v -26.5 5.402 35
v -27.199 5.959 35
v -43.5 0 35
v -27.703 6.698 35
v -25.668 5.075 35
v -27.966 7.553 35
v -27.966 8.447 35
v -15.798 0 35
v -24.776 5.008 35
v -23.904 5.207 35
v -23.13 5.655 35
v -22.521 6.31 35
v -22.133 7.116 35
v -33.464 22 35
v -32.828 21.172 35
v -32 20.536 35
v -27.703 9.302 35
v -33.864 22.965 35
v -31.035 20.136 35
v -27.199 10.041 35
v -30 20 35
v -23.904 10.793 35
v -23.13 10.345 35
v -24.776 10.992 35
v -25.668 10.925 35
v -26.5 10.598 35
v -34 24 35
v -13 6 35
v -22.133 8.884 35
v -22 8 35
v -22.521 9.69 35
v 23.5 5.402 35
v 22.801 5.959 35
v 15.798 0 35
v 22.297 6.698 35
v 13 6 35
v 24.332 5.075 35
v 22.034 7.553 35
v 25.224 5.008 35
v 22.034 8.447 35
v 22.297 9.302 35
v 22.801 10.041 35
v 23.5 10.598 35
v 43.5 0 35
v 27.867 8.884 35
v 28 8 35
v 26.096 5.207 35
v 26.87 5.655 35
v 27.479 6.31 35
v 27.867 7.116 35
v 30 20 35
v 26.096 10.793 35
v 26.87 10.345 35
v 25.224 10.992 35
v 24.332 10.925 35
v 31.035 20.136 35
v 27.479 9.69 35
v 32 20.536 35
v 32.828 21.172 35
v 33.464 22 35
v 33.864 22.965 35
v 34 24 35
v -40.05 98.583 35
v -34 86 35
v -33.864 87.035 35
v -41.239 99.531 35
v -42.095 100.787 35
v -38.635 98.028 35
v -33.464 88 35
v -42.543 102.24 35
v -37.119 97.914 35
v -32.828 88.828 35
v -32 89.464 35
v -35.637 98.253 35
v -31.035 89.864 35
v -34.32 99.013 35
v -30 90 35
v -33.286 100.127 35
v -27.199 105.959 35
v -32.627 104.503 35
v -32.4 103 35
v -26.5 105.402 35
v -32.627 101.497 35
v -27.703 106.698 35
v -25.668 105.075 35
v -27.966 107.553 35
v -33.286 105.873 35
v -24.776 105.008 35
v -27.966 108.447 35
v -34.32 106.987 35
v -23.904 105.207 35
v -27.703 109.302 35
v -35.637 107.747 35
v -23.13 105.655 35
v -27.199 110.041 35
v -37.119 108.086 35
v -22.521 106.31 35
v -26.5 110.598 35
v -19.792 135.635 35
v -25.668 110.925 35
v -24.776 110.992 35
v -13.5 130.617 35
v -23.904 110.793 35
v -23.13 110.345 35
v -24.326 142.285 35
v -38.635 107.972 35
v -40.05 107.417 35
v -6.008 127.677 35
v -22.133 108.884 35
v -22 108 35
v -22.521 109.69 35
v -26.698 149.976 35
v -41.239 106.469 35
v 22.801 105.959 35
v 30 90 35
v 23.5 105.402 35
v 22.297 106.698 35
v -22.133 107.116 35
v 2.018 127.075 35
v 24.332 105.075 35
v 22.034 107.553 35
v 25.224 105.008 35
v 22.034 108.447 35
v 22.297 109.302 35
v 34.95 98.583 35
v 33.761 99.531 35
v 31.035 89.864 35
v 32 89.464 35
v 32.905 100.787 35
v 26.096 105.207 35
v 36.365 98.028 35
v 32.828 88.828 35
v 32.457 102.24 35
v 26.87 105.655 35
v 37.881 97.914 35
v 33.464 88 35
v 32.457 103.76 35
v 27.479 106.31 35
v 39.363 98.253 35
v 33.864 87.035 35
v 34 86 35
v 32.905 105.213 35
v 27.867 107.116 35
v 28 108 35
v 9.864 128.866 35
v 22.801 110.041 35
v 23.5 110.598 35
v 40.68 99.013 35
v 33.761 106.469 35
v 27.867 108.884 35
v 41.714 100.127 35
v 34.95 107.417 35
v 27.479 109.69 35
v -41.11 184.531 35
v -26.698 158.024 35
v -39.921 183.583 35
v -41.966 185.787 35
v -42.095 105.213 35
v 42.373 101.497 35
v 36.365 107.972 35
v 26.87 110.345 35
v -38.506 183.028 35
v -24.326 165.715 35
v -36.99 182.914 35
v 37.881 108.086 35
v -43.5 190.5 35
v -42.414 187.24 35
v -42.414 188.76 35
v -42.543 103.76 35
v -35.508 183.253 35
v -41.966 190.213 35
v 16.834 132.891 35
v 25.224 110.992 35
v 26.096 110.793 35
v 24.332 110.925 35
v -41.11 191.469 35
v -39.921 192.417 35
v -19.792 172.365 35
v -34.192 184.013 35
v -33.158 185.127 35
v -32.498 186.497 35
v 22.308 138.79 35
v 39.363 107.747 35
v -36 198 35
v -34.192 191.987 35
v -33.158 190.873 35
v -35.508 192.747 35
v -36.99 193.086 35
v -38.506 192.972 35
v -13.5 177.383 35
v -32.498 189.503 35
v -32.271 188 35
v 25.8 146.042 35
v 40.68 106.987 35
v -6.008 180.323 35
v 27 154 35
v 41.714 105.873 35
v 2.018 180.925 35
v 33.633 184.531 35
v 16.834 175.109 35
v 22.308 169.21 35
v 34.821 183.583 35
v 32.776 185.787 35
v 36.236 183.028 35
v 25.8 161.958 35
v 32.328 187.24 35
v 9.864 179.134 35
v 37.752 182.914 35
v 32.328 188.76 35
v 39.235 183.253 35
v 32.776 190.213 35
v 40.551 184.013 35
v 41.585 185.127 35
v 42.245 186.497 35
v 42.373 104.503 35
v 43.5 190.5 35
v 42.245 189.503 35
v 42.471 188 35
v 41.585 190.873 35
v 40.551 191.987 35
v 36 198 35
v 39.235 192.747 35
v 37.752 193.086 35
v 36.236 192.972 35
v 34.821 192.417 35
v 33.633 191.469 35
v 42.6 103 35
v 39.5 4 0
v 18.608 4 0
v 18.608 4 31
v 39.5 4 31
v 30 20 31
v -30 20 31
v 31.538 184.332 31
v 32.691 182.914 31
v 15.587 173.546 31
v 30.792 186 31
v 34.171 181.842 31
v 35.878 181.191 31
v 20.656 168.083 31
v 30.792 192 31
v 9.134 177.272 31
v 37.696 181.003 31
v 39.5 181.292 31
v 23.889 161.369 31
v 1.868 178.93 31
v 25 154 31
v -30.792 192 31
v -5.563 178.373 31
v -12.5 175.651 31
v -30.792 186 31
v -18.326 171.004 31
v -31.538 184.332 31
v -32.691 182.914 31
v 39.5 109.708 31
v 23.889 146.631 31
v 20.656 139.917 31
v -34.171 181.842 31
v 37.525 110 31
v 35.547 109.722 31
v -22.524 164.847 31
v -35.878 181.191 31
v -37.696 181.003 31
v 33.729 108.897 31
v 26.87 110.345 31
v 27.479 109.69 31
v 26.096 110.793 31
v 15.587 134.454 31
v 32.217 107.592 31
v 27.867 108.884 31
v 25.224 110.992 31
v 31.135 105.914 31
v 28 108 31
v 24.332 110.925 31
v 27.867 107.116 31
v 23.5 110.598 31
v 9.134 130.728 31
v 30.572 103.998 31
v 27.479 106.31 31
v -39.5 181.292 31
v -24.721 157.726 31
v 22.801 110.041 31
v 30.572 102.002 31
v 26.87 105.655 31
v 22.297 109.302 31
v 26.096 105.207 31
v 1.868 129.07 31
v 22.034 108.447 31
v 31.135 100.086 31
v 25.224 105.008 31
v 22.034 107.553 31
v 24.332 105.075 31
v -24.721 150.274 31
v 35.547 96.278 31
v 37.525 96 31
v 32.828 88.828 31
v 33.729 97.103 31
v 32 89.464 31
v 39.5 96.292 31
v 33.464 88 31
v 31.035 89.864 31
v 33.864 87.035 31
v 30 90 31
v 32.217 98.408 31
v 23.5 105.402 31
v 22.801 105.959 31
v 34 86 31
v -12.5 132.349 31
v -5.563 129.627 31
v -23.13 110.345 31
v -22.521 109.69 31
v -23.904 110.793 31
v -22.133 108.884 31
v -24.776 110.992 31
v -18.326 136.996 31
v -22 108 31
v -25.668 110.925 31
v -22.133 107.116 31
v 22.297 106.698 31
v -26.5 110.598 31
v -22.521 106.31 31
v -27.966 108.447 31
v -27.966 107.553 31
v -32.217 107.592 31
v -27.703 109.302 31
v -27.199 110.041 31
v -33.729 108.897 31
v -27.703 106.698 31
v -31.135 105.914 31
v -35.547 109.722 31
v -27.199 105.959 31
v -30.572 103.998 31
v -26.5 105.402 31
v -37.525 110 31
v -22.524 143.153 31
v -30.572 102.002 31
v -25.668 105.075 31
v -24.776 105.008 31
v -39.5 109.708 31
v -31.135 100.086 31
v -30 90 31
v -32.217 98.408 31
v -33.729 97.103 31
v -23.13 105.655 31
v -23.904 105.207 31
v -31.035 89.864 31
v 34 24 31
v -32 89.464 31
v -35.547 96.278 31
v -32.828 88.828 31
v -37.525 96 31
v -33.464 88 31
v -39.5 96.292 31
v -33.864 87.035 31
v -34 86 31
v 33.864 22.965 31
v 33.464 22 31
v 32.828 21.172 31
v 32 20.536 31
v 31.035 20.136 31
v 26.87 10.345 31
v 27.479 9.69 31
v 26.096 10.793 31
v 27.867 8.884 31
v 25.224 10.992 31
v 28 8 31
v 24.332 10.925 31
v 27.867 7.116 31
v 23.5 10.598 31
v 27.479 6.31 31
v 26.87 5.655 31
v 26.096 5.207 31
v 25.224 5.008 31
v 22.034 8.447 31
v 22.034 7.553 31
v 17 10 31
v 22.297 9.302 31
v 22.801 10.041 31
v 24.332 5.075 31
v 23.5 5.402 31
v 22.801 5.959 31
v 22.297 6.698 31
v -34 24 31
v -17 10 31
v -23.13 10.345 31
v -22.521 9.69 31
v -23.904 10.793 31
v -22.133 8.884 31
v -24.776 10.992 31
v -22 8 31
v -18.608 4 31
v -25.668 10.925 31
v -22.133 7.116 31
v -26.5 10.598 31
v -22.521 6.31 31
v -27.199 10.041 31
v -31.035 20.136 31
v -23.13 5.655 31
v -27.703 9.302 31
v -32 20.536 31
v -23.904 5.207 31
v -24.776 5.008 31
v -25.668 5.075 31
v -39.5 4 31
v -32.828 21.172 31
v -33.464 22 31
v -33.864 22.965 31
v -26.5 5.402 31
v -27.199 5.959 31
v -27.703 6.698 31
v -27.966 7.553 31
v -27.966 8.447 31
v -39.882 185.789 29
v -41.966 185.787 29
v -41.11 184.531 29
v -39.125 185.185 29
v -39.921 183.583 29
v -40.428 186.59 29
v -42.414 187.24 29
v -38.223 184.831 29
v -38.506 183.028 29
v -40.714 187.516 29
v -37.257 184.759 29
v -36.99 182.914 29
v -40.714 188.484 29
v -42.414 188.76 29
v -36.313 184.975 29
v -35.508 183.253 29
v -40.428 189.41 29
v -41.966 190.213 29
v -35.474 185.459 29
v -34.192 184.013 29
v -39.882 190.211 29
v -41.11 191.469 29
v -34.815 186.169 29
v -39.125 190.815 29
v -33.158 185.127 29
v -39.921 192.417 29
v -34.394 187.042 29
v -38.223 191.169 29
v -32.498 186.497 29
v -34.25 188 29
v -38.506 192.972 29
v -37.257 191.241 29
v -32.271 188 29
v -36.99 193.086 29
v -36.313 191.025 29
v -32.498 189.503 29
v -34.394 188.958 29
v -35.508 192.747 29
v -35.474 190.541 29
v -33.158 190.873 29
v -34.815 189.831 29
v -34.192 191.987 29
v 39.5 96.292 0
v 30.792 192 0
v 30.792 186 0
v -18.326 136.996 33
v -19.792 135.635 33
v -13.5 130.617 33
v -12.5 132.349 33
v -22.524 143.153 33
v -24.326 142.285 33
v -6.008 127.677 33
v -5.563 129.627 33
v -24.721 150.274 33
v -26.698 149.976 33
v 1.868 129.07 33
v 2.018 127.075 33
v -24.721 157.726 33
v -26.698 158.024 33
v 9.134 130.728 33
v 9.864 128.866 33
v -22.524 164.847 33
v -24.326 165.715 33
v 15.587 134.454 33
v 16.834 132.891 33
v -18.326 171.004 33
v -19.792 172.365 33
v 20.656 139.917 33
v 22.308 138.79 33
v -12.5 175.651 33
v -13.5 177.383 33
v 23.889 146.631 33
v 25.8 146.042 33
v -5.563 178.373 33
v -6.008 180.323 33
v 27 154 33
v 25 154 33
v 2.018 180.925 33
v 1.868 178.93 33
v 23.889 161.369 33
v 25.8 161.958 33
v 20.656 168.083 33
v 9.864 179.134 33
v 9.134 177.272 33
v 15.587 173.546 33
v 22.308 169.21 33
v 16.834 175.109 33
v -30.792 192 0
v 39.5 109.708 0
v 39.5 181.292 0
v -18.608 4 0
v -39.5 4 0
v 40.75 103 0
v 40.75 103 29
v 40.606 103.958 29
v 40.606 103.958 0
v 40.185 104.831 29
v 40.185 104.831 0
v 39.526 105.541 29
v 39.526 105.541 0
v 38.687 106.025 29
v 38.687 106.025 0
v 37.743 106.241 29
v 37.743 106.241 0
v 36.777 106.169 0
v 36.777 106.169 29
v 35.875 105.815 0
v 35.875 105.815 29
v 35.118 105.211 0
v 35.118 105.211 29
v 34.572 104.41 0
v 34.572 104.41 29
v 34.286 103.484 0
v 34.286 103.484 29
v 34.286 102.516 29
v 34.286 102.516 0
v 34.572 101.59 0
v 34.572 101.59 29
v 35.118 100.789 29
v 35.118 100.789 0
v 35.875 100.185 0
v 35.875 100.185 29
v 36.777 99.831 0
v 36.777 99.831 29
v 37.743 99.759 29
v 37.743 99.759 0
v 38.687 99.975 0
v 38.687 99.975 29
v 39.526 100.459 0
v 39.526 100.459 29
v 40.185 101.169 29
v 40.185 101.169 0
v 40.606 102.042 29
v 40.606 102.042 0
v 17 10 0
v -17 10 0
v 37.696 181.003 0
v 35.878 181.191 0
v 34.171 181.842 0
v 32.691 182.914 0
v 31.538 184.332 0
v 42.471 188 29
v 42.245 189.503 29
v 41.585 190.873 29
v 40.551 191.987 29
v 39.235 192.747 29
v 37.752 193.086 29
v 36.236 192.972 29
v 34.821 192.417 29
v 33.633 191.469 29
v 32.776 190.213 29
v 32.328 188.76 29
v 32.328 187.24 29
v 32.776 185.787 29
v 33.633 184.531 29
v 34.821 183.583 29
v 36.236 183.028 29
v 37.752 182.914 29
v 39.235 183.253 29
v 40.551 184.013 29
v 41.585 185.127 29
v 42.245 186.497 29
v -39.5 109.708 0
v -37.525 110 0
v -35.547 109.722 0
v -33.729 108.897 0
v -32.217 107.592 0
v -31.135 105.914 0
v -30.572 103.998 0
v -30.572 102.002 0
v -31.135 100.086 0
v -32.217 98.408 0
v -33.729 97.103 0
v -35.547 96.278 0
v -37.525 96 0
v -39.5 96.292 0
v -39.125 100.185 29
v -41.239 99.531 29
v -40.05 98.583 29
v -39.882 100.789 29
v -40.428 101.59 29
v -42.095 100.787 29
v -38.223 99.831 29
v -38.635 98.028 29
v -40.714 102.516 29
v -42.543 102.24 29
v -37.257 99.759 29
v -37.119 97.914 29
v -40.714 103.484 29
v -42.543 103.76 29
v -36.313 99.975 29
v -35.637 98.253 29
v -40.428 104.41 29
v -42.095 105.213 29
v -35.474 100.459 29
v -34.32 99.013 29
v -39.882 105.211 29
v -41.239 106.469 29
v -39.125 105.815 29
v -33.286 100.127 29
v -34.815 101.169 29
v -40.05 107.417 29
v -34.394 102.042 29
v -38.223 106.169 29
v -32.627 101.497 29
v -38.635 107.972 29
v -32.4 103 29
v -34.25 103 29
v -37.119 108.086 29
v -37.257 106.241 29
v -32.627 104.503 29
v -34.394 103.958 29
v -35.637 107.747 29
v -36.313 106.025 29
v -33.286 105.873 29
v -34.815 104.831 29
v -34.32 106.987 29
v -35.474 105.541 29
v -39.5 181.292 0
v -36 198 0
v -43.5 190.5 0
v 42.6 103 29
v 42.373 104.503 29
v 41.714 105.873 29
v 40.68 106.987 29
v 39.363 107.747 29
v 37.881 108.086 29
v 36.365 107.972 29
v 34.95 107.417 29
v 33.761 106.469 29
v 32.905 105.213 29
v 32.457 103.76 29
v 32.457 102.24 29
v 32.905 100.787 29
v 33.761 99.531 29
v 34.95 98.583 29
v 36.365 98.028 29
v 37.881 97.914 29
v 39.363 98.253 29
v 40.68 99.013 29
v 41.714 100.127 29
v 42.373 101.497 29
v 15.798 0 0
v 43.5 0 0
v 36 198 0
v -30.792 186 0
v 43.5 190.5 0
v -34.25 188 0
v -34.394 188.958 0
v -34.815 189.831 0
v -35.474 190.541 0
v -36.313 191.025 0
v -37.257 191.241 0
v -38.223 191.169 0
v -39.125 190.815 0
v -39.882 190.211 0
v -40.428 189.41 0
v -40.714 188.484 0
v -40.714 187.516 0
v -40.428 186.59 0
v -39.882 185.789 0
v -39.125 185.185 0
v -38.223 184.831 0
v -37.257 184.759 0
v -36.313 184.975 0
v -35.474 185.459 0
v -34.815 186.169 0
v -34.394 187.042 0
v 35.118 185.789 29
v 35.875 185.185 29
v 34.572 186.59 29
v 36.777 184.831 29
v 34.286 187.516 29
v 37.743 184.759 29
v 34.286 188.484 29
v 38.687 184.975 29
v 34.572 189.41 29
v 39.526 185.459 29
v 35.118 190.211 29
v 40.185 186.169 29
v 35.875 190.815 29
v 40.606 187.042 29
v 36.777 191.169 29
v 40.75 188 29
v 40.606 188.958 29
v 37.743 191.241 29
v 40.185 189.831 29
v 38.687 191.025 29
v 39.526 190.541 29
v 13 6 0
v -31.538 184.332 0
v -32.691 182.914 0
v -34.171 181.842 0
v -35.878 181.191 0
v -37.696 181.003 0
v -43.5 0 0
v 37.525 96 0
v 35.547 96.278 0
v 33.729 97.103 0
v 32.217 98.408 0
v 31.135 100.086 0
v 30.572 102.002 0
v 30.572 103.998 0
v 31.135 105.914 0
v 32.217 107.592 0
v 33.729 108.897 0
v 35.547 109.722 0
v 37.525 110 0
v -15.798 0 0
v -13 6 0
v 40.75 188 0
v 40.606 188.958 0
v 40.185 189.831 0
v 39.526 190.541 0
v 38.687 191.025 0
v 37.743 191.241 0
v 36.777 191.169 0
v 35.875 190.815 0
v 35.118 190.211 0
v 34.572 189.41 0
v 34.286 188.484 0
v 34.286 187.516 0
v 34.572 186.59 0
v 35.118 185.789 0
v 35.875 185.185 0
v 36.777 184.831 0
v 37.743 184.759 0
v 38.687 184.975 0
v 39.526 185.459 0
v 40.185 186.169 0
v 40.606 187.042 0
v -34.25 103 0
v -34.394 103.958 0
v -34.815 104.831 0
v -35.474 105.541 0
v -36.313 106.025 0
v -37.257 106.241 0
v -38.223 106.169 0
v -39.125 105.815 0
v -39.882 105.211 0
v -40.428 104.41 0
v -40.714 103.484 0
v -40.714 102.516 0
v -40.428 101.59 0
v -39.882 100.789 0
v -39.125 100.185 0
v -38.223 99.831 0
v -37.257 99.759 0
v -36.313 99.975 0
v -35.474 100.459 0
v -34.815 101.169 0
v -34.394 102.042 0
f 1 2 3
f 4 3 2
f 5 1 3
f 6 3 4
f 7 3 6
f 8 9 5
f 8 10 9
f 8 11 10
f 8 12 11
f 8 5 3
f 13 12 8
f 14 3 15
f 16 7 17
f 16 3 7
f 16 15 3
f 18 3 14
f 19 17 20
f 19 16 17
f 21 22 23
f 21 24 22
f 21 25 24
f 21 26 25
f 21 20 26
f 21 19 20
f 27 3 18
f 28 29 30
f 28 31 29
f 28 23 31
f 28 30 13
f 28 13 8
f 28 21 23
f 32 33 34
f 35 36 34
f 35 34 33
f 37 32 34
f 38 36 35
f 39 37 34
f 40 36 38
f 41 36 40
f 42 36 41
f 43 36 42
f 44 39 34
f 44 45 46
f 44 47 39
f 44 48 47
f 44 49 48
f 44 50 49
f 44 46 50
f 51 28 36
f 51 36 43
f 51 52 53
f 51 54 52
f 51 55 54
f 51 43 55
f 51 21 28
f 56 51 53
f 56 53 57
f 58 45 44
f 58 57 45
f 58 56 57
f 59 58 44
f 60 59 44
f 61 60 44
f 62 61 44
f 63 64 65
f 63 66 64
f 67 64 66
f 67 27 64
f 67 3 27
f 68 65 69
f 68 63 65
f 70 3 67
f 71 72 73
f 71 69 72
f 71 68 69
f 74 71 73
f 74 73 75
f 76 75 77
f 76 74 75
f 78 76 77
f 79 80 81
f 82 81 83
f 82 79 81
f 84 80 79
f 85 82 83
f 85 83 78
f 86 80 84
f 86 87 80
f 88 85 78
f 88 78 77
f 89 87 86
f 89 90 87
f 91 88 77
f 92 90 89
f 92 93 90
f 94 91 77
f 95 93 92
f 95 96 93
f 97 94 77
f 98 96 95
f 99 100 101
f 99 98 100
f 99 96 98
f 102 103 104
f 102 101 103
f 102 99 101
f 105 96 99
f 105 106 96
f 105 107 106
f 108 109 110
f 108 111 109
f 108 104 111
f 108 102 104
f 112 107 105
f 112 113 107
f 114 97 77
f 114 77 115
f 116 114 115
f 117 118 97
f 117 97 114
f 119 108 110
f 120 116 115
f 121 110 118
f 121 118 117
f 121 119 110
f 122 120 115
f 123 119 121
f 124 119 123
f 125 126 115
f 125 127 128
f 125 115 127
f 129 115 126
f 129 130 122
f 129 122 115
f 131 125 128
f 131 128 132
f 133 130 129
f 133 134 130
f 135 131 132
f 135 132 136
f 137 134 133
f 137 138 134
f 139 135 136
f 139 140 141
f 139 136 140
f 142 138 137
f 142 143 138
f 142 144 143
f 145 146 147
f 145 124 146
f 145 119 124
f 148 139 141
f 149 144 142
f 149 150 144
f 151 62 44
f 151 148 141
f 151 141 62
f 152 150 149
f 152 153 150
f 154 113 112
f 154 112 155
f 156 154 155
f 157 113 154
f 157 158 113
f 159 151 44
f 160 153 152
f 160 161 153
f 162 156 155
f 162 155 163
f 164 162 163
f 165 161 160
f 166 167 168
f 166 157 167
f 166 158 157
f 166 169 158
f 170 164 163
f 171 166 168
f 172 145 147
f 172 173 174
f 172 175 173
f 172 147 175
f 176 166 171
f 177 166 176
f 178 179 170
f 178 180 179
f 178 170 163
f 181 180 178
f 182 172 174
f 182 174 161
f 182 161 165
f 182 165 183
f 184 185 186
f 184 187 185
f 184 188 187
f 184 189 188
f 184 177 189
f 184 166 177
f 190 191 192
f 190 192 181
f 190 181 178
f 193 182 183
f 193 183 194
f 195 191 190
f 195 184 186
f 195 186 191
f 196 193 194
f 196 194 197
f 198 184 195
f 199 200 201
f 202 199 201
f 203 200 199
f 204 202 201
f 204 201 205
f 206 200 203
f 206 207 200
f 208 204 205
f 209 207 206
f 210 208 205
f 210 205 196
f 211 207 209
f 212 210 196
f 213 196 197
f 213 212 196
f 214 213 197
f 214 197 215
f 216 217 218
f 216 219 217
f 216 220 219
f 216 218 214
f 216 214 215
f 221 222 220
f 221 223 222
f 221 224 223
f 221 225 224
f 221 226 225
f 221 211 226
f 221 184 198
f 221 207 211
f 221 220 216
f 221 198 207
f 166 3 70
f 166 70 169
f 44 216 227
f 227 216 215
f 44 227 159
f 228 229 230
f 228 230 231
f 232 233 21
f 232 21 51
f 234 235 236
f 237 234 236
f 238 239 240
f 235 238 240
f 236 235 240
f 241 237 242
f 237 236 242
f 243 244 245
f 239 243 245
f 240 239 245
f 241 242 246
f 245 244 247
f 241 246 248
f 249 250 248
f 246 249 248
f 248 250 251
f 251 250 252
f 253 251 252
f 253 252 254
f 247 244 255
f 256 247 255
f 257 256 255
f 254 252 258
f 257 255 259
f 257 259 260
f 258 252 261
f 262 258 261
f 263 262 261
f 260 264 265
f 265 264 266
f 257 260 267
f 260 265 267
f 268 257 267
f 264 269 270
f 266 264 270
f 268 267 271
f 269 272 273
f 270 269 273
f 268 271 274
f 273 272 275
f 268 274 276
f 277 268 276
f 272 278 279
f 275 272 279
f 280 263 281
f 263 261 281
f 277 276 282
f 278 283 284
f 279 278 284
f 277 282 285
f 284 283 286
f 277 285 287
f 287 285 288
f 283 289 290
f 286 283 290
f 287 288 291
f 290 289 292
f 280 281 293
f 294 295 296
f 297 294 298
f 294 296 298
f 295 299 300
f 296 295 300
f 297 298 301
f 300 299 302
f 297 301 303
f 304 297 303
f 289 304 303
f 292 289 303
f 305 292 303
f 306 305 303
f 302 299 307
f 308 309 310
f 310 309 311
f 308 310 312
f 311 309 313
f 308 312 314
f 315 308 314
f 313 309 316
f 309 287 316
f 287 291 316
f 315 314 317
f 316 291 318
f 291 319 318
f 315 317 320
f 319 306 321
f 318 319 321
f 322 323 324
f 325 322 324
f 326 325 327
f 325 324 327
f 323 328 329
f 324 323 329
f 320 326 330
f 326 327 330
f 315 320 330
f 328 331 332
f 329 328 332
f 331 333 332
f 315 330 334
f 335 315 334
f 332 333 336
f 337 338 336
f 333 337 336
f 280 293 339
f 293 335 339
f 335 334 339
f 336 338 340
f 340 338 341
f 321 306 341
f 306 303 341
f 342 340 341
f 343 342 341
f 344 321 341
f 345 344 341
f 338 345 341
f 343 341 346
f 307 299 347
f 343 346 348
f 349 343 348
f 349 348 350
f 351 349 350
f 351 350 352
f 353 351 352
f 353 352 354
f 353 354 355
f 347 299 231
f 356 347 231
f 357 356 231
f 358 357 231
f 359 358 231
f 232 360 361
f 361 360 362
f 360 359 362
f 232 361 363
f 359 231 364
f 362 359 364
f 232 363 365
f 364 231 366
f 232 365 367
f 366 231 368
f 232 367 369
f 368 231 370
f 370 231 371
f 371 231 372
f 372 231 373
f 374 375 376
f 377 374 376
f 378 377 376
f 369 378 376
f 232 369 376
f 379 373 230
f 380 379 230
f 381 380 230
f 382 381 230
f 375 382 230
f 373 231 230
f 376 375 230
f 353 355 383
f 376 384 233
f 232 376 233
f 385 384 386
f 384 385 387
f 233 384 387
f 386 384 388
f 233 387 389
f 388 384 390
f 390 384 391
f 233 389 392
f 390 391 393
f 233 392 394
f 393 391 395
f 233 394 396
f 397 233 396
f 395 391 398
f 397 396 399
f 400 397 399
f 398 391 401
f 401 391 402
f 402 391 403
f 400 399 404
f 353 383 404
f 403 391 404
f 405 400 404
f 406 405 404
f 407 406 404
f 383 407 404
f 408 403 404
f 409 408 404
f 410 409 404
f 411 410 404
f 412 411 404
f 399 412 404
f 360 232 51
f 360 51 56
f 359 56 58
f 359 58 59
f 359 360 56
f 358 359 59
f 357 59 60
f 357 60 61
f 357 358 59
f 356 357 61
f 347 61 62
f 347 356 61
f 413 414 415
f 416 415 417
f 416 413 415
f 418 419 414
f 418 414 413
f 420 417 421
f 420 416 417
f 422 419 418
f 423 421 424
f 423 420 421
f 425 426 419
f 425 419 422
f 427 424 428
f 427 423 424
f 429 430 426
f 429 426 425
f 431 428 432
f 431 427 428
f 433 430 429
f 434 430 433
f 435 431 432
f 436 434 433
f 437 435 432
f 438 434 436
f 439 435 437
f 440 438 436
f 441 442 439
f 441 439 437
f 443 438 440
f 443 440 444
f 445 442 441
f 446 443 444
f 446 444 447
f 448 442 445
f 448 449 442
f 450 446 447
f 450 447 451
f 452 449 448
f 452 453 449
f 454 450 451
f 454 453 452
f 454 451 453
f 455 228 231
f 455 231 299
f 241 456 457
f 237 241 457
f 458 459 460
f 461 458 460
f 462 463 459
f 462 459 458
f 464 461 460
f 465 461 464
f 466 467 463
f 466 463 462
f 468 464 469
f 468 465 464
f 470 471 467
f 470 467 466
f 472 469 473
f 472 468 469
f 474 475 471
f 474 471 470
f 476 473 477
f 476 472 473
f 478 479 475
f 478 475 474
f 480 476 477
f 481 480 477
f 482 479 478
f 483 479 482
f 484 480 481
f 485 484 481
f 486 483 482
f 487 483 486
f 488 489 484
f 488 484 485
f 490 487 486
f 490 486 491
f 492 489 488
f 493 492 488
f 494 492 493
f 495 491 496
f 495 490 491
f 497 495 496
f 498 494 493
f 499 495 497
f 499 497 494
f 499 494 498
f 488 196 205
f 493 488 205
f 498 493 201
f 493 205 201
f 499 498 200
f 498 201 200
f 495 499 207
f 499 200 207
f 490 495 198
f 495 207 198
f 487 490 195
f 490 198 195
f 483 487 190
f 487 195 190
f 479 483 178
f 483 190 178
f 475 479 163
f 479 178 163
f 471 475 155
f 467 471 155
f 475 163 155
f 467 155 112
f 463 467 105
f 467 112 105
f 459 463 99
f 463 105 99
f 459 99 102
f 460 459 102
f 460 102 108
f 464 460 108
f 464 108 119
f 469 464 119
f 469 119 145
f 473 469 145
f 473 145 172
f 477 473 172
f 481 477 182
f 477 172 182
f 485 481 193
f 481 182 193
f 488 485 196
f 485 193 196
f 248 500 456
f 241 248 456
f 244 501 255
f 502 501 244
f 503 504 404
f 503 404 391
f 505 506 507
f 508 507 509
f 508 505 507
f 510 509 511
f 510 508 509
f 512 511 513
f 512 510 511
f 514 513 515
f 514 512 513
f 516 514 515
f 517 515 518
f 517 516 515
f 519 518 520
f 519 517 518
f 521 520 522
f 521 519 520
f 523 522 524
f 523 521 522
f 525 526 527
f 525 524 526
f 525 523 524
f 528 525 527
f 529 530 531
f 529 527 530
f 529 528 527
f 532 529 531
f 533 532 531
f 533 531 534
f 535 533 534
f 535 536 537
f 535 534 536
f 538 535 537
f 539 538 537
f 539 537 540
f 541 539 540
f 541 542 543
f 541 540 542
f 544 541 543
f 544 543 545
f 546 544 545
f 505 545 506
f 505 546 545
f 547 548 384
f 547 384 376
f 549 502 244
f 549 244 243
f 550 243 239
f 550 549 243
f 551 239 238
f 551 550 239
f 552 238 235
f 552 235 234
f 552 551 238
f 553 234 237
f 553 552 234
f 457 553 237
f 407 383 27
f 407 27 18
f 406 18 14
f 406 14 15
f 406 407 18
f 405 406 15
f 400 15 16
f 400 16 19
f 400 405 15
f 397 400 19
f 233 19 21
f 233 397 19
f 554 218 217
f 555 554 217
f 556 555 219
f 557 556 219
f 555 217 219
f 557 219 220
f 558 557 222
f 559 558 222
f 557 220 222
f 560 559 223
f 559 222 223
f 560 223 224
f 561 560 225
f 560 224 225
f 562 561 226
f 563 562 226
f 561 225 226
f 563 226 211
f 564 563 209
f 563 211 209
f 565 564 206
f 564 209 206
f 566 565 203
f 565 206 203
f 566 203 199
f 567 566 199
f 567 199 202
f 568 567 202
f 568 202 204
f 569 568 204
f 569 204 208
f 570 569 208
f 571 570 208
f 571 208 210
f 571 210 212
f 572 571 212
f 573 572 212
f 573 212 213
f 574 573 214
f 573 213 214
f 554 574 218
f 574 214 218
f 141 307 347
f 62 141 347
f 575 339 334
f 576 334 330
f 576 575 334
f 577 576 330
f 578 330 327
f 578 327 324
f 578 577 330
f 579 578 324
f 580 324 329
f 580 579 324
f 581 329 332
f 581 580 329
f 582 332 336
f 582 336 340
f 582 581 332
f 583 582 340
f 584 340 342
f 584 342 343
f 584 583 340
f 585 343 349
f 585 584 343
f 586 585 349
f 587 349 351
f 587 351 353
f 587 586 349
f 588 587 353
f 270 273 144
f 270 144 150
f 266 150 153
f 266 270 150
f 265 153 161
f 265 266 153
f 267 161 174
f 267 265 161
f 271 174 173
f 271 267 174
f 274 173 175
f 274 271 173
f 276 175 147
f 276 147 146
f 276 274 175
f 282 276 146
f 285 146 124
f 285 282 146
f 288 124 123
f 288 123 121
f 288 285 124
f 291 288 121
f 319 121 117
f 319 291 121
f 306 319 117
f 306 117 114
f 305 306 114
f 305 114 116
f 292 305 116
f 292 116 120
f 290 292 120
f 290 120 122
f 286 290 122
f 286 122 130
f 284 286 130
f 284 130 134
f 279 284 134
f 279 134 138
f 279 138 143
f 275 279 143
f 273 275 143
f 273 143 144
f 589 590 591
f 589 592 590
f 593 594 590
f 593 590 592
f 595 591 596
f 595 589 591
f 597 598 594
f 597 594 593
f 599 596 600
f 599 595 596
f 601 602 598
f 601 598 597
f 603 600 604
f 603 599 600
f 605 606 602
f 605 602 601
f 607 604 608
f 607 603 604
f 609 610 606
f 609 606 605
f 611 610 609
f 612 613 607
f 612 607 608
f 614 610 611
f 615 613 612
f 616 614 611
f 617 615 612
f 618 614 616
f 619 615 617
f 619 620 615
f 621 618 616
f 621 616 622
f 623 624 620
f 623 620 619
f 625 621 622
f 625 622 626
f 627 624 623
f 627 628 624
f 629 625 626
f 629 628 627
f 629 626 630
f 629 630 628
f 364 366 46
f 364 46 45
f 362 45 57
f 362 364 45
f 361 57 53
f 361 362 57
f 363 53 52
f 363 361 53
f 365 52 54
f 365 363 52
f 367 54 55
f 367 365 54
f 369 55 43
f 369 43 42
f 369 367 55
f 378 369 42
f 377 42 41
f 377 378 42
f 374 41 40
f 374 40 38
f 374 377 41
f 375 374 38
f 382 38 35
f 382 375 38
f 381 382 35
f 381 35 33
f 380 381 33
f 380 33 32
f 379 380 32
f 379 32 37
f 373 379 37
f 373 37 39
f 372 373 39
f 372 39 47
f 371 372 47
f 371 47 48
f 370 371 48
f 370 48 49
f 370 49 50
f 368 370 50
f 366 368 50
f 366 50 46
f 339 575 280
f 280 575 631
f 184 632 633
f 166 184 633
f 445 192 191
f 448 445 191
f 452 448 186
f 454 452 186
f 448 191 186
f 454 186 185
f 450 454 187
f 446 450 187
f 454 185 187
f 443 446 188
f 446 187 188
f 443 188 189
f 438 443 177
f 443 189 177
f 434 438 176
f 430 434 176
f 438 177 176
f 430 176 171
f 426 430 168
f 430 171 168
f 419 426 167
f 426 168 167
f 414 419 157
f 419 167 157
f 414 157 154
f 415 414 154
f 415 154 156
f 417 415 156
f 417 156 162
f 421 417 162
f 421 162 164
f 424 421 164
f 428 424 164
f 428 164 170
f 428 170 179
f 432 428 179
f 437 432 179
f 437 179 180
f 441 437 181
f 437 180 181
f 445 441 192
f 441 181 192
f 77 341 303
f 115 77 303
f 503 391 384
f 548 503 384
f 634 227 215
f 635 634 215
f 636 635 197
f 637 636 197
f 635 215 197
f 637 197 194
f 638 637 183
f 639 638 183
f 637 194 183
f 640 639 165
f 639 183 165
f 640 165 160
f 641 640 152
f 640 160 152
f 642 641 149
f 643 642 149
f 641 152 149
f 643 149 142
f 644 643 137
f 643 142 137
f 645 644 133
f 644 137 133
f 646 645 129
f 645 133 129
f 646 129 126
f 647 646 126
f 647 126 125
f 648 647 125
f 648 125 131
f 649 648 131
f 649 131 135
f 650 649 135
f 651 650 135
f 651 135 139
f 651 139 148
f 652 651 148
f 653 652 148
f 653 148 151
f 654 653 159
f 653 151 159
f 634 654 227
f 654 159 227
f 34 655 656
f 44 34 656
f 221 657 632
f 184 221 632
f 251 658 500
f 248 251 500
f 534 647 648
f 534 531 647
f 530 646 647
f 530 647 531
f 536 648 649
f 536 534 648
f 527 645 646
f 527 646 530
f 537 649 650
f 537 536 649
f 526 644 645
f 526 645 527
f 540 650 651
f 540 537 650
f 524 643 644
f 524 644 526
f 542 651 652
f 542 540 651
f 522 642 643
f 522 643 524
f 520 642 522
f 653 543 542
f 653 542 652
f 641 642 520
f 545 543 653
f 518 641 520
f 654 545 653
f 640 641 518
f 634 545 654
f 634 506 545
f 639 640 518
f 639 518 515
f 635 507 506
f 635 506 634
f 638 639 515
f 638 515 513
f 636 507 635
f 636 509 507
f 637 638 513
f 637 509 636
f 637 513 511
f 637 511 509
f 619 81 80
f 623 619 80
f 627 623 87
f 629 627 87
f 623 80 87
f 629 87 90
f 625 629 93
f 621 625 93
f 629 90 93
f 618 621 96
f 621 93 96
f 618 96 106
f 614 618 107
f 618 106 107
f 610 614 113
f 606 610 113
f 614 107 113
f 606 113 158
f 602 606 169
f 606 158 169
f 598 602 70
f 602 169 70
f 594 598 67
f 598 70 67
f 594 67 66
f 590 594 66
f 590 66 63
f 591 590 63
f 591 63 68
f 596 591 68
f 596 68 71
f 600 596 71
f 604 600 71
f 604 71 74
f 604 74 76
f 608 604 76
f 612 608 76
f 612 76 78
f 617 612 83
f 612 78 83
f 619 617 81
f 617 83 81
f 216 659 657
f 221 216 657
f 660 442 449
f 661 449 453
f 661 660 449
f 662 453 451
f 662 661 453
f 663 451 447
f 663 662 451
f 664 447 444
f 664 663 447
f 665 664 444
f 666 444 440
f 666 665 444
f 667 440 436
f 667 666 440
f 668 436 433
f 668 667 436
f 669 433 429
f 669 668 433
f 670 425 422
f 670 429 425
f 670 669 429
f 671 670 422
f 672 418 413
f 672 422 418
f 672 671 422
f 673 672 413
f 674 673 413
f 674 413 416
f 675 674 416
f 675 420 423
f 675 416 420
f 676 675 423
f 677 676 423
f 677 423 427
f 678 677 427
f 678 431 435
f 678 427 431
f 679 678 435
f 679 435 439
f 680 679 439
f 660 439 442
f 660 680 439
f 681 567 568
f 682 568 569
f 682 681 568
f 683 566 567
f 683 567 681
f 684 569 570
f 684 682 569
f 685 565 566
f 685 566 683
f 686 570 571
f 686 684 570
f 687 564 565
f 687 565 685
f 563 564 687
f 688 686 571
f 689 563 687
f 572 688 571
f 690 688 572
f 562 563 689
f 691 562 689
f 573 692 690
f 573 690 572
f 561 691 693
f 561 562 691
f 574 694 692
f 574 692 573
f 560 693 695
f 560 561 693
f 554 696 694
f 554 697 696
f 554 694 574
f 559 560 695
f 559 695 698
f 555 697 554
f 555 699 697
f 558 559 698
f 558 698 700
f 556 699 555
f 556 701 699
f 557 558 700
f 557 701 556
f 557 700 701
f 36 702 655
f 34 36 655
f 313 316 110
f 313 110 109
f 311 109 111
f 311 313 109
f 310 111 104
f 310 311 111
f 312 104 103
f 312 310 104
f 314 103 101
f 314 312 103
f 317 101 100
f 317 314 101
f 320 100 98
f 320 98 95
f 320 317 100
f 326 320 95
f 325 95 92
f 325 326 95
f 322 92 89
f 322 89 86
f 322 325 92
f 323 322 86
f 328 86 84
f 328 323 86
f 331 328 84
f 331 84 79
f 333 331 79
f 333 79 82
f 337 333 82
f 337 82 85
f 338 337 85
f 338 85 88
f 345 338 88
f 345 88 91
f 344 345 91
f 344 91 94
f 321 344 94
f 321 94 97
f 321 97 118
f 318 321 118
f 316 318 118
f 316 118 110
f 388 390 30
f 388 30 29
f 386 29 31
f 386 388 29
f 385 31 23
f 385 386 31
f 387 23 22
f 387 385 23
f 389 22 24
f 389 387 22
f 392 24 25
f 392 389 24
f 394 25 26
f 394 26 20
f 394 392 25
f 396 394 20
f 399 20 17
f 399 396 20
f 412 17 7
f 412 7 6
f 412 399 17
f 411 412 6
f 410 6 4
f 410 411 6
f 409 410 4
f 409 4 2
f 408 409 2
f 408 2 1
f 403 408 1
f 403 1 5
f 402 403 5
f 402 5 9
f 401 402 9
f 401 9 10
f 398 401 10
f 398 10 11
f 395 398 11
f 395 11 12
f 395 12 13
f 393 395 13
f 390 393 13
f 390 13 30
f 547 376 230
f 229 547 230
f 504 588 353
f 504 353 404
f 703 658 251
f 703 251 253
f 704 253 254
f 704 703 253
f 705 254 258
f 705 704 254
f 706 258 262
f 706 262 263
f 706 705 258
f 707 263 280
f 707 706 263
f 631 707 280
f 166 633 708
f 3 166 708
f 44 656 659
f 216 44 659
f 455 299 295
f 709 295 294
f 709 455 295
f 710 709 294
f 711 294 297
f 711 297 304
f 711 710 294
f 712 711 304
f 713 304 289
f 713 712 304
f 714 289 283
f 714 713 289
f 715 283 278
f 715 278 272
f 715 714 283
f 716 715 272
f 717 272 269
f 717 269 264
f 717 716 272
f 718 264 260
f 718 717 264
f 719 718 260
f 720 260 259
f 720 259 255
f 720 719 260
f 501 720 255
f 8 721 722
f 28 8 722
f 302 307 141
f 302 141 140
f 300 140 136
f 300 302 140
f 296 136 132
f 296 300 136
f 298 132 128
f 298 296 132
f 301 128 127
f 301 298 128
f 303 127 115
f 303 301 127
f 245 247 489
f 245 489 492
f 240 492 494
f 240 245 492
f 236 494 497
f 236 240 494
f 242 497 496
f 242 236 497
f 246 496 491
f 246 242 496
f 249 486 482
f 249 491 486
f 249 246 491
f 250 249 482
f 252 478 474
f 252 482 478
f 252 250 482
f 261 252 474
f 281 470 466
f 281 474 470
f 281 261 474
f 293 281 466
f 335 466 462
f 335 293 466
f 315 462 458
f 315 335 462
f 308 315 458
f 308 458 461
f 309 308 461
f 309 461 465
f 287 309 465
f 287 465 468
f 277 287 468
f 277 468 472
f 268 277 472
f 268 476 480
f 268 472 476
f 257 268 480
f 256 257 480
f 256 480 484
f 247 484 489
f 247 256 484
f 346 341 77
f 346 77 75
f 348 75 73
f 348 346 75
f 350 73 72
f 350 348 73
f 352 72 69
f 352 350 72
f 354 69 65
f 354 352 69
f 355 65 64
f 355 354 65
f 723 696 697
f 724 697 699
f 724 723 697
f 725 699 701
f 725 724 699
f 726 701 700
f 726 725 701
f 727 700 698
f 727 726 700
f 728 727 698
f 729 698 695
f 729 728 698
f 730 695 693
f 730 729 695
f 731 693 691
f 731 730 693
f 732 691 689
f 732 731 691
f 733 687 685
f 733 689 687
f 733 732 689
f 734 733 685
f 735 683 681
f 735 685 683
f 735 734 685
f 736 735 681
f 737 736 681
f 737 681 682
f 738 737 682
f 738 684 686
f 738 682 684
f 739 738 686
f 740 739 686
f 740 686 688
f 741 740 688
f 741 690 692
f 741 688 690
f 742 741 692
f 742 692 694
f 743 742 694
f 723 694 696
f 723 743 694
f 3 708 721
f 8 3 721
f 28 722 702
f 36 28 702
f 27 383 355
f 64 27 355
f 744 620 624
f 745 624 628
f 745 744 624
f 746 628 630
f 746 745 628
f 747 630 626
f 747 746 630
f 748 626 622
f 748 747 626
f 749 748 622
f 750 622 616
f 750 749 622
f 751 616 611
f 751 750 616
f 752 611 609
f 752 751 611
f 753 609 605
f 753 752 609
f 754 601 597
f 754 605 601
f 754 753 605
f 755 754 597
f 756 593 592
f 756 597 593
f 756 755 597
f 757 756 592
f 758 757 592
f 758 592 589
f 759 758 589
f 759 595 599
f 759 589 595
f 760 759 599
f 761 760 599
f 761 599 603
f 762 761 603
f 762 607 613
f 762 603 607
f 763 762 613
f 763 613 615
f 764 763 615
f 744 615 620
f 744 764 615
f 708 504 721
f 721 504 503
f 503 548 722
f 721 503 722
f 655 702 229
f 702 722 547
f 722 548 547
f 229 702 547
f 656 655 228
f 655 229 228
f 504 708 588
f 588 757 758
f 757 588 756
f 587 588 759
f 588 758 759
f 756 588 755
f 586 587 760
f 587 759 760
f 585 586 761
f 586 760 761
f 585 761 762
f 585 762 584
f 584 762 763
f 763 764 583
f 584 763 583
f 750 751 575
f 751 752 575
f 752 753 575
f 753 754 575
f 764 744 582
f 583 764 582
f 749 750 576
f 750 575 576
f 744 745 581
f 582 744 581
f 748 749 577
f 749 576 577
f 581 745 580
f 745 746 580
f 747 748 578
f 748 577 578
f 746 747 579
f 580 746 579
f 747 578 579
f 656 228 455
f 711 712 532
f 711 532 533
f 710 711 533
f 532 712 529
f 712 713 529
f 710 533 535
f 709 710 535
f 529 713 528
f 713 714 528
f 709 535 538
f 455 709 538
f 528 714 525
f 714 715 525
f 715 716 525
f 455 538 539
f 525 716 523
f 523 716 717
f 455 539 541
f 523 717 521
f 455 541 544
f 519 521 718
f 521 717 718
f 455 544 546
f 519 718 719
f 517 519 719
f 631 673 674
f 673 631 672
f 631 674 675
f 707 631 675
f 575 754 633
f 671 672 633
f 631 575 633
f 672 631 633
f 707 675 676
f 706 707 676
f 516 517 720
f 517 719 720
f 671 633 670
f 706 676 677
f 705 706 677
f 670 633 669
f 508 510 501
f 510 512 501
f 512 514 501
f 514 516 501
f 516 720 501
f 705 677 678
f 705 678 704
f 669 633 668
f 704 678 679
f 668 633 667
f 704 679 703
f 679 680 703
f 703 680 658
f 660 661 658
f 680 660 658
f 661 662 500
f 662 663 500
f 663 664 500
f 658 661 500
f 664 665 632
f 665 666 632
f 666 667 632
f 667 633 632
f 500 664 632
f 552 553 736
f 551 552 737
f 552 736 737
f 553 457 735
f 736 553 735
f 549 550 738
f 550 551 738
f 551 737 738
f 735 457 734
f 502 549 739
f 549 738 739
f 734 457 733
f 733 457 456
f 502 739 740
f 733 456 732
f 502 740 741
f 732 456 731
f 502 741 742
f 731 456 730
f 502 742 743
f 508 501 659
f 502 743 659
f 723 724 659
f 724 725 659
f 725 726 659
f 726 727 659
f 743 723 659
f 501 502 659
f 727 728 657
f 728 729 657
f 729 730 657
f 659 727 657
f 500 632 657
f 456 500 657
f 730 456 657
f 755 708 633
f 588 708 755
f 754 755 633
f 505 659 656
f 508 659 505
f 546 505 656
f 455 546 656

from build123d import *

# Parameters (mm, degrees)
SKETCH_R        = 3.25
SKETCH_R_2      = 3
SKETCH_R_3      = 25
PAD_DEPTH       = 35
POCKET_DEPTH    = 31
SKETCH003_R     = 5.1
POCKET001_DEPTH = 6
SKETCH004_R     = 27
POCKET002_DEPTH = 2


with BuildPart() as part:
    # Sketch → Pad (new body)
    with BuildSketch(Plane.XY):
        Polygon((-43.5, 190.5), (-43.5, 0), (-15.797846, 0), (-13, 6), (13, 6), (15.797846, 0), (43.5, 0), (43.5, 190.5), (36, 198), (-36, 198), align=None)
        with Locations((-37.5, 188)):
            Circle(SKETCH_R, mode=Mode.SUBTRACT)
        with Locations((37.5, 188)):
            Circle(SKETCH_R, mode=Mode.SUBTRACT)
        with Locations((-25, 108)):
            Circle(SKETCH_R_2, mode=Mode.SUBTRACT)
        with Locations((25, 108)):
            Circle(SKETCH_R_2, mode=Mode.SUBTRACT)
        with Locations((37.5, 103)):
            Circle(SKETCH_R, mode=Mode.SUBTRACT)
        with Locations((-37.5, 103)):
            Circle(SKETCH_R, mode=Mode.SUBTRACT)
        with Locations((-25, 8)):
            Circle(SKETCH_R_2, mode=Mode.SUBTRACT)
        with Locations((25, 8)):
            Circle(SKETCH_R_2, mode=Mode.SUBTRACT)
        with Locations((0, 154)):
            Circle(SKETCH_R_3, mode=Mode.SUBTRACT)
        with BuildLine():
            ThreePointArc((-30, 90), (-32.828431, 88.828423), (-34, 85.999989))
            Line((-34, 24), (-34, 85.999989))
            ThreePointArc((-34, 24), (-32.828427, 21.171573), (-30, 20))
            Line((-30, 20), (30, 20))
            ThreePointArc((30, 20), (32.828427, 21.171573), (34, 24))
            Line((34, 85.999989), (34, 24))
            ThreePointArc((34, 85.999989), (32.828431, 88.828424), (29.999999, 90))
            Line((-30, 90), (29.999999, 90))
        make_face(mode=Mode.SUBTRACT)
    extrude(amount=PAD_DEPTH)

    # Sketch002 → Pocket (cut)
    with BuildSketch(Plane(origin=(0, 0, 0), x_dir=(1, 0, 0), z_dir=(0, 0, -1))):
        with BuildLine():
            Line((-39.5, -96.291796), (-39.5, -4))
            Line((-39.5, -4), (-18.607695, -4))
            Line((-18.607695, -4), (-17, -10))
            Line((-17, -10), (17, -10))
            Line((17, -10), (18.607695, -4))
            Line((18.607695, -4), (39.5, -4))
            Line((39.5, -4), (39.5, -96.291796))
            ThreePointArc((39.5, -96.291796), (30.5, -103), (39.5, -109.708204))
            Line((39.5, -109.708204), (39.5, -181.291796))
            ThreePointArc((39.5, -181.291796), (34.170797, -181.84237), (30.791796, -186))
            Line((30.791796, -192), (30.791796, -186))
            Line((-30.791796, -192), (30.791796, -192))
            Line((-30.791796, -186), (-30.791796, -192))
            ThreePointArc((-30.791796, -186), (-34.170797, -181.84237), (-39.5, -181.291796))
            Line((-39.5, -109.708204), (-39.5, -181.291796))
            ThreePointArc((-39.5, -109.708204), (-30.5, -103), (-39.5, -96.291796))
        make_face()
    extrude(amount=-POCKET_DEPTH, mode=Mode.SUBTRACT)

    # Sketch003 → Pocket001 (cut)
    with BuildSketch(Plane.XY.offset(35)):
        with Locations((-37.371348, 188)):
            Circle(SKETCH003_R)
        with Locations((37.371348, 188)):
            Circle(SKETCH003_R)
        with Locations((-37.5, 103)):
            Circle(SKETCH003_R)
        with Locations((37.5, 103)):
            Circle(SKETCH003_R)
    extrude(amount=-POCKET001_DEPTH, mode=Mode.SUBTRACT)

    # Sketch004 → Pocket002 (cut)
    with BuildSketch(Plane.XY.offset(35)):
        with Locations((0, 154)):
            Circle(SKETCH004_R)
    extrude(amount=-POCKET002_DEPTH, mode=Mode.SUBTRACT)


solid = part.part
